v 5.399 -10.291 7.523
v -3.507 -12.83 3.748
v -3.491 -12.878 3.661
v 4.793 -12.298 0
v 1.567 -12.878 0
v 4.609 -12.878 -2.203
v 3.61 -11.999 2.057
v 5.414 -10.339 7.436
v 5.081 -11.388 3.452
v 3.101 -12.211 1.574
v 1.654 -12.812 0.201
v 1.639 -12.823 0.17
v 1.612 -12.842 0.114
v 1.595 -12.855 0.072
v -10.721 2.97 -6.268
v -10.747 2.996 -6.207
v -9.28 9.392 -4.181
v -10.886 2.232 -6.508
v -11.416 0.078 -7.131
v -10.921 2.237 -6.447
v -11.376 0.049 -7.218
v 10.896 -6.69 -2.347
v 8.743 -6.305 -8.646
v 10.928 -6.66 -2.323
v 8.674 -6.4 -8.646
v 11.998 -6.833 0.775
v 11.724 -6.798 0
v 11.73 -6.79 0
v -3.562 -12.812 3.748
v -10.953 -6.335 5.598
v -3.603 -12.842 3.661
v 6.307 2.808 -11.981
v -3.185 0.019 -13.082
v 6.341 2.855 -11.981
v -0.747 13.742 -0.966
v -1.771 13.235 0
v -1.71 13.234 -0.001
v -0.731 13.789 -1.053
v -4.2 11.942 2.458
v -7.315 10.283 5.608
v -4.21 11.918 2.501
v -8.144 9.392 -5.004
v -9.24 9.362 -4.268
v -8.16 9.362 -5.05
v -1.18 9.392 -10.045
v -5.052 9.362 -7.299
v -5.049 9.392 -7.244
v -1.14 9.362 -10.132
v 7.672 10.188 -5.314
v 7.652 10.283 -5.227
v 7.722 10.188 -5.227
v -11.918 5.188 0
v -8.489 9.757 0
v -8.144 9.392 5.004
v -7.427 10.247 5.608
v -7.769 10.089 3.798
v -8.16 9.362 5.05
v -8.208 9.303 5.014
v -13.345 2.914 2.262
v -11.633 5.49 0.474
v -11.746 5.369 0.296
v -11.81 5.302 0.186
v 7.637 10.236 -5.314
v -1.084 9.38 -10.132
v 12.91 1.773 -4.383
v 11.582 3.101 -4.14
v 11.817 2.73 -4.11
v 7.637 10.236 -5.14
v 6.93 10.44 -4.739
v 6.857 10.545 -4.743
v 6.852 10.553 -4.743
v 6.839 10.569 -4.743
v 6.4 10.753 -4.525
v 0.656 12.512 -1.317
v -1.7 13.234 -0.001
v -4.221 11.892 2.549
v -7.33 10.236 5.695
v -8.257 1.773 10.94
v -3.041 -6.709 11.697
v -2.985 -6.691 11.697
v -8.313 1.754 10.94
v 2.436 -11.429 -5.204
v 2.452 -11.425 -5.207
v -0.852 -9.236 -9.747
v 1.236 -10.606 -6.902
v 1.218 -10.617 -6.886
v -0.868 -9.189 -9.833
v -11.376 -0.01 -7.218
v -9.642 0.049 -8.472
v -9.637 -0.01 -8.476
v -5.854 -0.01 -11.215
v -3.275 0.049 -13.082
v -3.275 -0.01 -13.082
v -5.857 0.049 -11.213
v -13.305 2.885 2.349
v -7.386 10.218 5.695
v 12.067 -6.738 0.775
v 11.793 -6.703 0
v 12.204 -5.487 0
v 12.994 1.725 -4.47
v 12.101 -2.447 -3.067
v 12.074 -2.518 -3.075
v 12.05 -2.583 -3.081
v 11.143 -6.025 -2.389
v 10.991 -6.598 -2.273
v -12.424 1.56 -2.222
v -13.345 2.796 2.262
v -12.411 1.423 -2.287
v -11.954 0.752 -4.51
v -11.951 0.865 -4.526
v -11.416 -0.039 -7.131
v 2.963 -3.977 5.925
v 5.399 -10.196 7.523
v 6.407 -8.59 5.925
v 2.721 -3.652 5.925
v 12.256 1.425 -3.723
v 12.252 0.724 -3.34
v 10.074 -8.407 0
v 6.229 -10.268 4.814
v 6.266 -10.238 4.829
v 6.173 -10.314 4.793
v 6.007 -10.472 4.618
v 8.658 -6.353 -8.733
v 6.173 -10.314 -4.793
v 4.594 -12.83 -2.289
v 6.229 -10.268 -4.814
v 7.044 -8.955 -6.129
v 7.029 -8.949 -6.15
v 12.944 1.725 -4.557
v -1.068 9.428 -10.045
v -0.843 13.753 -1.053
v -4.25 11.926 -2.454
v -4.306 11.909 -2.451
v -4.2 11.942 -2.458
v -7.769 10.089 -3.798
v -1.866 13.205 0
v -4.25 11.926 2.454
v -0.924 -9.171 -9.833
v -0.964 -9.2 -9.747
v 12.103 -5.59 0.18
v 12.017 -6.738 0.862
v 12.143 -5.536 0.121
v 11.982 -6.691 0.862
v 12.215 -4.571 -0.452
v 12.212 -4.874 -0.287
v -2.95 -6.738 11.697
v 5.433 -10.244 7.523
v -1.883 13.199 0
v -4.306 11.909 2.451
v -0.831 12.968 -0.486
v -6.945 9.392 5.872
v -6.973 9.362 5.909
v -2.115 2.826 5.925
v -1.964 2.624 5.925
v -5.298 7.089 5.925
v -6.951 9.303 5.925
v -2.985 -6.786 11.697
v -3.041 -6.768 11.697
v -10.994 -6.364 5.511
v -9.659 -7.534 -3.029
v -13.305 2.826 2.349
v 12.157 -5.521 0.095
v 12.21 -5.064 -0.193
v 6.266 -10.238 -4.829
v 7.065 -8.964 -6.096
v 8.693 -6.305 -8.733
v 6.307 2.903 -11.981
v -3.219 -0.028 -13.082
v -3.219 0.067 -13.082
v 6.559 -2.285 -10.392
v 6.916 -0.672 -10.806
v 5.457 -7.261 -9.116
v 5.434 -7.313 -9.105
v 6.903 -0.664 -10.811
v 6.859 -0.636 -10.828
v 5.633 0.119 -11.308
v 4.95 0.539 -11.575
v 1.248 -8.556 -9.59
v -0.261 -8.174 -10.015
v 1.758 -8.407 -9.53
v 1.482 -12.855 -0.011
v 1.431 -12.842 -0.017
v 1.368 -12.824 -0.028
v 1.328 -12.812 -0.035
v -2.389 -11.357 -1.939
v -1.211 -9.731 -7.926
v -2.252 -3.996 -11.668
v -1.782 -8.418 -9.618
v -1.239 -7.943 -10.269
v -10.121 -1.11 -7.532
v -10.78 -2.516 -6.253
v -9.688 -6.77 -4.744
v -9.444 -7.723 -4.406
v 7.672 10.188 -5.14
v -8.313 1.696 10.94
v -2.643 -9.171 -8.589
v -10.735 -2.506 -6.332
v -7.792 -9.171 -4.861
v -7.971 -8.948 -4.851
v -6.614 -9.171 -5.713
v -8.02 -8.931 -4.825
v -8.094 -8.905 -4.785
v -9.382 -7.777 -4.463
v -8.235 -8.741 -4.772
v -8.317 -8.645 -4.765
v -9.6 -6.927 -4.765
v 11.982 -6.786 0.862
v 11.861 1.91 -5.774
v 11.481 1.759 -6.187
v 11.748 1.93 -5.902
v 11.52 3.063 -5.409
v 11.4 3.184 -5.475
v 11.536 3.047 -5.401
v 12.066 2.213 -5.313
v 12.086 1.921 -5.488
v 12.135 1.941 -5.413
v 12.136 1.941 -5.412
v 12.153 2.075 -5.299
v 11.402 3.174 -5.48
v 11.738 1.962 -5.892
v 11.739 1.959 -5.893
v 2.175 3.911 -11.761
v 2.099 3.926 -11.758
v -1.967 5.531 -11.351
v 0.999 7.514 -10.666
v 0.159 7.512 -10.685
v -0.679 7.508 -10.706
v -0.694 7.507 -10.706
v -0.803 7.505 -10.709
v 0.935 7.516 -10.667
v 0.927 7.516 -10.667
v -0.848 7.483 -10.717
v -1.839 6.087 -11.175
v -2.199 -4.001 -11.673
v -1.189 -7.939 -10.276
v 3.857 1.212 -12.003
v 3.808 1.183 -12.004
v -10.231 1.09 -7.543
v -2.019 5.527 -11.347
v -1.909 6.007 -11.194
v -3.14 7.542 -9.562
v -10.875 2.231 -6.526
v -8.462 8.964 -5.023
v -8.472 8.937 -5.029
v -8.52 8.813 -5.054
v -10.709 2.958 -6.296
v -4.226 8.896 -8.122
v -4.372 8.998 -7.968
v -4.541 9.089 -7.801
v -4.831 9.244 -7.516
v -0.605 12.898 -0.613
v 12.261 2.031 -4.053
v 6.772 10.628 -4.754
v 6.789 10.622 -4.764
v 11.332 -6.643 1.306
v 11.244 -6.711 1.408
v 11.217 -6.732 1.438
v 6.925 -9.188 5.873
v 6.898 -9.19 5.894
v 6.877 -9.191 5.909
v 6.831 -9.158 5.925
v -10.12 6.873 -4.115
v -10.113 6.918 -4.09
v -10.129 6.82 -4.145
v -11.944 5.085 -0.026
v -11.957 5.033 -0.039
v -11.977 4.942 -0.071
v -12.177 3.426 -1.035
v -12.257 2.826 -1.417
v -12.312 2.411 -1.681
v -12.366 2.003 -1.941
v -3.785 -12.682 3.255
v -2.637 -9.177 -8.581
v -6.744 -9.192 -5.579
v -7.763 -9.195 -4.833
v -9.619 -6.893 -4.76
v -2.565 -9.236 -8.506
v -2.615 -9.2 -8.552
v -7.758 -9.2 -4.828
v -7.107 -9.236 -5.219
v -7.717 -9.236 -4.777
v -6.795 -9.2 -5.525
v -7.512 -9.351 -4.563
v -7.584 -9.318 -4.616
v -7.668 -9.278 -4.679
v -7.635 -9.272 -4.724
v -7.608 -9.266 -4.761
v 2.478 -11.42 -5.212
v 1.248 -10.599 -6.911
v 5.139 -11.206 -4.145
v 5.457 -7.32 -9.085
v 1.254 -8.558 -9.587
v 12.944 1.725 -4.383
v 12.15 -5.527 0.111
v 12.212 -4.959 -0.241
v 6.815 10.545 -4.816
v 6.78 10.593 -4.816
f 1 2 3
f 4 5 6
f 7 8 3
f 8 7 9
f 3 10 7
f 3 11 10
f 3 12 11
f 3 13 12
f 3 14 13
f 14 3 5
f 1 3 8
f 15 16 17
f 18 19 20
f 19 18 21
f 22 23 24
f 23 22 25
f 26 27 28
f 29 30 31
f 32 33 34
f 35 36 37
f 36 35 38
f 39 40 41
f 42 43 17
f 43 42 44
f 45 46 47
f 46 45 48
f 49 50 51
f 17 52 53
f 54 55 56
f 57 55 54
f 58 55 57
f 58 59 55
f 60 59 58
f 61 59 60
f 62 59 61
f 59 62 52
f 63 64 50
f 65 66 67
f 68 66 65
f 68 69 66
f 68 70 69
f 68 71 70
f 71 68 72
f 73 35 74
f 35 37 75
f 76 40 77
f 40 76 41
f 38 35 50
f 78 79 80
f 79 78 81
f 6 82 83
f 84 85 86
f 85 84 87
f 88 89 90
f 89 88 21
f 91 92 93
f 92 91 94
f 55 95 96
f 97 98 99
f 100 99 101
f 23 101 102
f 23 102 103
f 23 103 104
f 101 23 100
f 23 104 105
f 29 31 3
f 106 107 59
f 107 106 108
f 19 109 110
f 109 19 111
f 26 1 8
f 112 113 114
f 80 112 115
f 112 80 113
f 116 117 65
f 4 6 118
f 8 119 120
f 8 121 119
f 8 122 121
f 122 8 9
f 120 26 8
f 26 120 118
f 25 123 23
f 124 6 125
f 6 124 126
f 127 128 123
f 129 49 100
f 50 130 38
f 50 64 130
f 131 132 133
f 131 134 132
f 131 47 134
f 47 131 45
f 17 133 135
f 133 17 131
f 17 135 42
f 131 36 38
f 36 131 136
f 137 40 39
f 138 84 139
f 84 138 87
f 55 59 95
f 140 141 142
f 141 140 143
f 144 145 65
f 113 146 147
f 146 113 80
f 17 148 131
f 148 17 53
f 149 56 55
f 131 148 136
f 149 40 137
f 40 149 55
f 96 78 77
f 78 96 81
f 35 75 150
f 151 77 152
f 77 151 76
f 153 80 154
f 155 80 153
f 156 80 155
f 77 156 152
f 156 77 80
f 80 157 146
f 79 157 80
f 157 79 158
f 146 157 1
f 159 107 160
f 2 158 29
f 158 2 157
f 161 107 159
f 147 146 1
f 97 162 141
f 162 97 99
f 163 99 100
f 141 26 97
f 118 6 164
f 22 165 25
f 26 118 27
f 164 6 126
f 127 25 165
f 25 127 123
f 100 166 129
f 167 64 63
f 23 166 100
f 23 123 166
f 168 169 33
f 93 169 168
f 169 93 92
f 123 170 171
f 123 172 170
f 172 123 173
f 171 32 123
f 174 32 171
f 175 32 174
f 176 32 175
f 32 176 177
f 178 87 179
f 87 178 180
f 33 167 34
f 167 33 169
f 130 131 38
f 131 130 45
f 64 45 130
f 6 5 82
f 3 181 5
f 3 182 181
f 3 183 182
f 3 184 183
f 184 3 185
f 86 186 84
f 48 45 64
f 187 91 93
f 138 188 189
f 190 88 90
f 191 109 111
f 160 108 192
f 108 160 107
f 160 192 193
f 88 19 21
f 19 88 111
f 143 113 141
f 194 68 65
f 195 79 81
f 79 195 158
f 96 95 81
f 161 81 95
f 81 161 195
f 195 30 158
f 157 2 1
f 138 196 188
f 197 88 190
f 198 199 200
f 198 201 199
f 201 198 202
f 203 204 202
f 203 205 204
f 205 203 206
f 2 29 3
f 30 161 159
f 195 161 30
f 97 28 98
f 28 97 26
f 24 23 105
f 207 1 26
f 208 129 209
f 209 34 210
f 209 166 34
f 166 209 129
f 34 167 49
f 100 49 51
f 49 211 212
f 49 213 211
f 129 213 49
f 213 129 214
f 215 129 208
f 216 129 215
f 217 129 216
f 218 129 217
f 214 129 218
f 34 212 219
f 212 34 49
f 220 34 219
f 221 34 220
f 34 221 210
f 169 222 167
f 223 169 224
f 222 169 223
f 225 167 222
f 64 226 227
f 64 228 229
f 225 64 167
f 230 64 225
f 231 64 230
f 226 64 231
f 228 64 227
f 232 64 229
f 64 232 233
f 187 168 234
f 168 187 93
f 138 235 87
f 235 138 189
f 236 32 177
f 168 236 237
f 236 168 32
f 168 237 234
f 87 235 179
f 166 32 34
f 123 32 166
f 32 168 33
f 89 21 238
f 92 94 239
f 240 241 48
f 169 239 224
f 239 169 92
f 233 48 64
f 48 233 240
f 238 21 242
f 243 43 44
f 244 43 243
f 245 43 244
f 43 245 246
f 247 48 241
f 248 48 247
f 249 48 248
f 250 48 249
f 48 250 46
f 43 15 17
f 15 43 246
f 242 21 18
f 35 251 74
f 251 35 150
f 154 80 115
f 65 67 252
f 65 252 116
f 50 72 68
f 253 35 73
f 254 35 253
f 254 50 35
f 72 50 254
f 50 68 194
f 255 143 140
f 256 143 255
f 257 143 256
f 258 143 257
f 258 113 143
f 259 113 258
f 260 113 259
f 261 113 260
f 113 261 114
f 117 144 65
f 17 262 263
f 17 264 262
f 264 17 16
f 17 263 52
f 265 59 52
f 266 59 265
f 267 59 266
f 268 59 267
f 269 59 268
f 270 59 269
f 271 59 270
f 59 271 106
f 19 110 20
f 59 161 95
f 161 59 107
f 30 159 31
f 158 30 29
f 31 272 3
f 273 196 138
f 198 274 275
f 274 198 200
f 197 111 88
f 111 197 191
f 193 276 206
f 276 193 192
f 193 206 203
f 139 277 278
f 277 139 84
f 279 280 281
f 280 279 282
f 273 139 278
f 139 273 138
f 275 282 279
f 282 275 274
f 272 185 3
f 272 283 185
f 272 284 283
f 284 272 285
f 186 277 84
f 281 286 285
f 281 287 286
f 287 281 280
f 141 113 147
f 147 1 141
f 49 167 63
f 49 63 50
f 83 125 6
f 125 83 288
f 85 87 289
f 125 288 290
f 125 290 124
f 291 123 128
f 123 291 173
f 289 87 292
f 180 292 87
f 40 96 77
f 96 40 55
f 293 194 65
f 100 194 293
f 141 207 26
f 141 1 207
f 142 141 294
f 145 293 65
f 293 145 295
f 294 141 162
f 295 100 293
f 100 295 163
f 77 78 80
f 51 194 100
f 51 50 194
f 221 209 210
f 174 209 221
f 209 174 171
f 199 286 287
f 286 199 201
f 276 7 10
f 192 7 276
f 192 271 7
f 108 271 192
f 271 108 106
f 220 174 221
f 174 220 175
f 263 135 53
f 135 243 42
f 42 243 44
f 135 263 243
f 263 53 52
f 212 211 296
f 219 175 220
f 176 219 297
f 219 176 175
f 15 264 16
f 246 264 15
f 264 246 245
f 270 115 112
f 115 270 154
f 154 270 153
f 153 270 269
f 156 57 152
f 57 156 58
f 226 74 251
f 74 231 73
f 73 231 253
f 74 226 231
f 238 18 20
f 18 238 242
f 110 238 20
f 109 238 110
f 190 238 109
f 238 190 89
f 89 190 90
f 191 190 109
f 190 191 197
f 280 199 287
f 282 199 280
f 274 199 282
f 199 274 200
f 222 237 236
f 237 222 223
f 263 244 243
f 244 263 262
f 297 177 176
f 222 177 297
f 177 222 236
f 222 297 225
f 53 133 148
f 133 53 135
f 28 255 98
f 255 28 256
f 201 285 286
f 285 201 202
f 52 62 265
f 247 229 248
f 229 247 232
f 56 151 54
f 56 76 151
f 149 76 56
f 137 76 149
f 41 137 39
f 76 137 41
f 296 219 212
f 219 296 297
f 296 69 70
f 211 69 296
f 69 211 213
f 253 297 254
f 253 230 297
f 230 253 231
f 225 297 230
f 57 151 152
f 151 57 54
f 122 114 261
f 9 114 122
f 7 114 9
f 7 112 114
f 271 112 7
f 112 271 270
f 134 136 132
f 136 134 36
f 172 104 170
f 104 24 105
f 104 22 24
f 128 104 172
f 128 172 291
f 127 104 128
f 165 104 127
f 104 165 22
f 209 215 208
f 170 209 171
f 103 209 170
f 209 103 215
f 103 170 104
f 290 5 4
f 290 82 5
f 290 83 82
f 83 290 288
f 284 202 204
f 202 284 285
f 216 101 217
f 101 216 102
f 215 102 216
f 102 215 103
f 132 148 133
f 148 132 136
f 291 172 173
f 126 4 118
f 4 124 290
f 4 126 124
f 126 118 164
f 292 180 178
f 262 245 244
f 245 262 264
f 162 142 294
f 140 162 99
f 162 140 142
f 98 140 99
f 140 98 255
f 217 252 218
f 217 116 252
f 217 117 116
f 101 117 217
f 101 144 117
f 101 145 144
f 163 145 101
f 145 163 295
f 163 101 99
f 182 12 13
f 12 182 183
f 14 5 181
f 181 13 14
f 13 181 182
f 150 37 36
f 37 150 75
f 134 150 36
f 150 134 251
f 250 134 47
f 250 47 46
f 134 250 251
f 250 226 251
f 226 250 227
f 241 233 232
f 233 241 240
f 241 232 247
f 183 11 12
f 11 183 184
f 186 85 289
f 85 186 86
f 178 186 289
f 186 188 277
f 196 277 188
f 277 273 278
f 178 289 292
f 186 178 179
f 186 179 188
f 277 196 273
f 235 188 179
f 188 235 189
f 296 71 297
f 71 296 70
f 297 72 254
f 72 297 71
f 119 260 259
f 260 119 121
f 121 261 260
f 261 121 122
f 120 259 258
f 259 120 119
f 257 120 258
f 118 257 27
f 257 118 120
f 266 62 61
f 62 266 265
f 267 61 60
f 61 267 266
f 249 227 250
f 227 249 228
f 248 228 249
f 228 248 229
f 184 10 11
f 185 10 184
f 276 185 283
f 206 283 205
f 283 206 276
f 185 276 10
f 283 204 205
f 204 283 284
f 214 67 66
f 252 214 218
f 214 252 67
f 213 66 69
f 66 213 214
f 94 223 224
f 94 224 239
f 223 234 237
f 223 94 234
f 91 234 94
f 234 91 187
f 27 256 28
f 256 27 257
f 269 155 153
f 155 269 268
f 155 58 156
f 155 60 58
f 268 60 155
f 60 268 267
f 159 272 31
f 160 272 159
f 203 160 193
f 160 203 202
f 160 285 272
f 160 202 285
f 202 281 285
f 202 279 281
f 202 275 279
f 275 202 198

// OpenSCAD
// Auto-generated OpenSCAD file

    inner_points = 10*[[-0.8272709439258851, 0.17250574680152558, -1.085356370379995], [-0.3000208722060624, -0.673824517218672, -1.1610692891914136], [0.7621572748828489, 1.018836010821184, 0.5227077285305861], [1.2894073466026714, 0.17250574680098618, 0.44699480971916755], [-0.7345602979402426, 1.0188360108215655, -0.5608281820767405], [0.53833397596794, -1.0243859908227981, -0.74361533751812], [-0.07619757329115358, 1.3693974844253103, 0.10525377685729254], [1.1966967006170288, -0.6738245172190535, -0.0775333785840871], [-1.0912605548199168, -0.6305363851239965, -0.5510972387851012], [0.6291241521432895, 0.2855248915222844, 1.189458799445929], [-0.9199536182758472, 0.9332780322219801, 0.41810447601210515], [0.4578172155992198, -1.278289525823692, 0.22025708464872243], [-1.326431597387023, 0.2855248915227826, -0.22624909246720426], [-0.3522004978329189, -1.2782895258234854, -0.36614832454032104], [-0.10993590484370842, 0.9332780322217736, 1.0045098852011487], [0.8642951947103956, -0.6305363851244946, 0.864610653128032], [0.018107748679271438, 0.7039670605239071, -1.1390568182894552], [0.5453578203990939, -0.14236320349629056, -1.2147697371008737], [0.6764704733283603, 1.054528534127652, -0.47297485935542216], [1.203720545048183, 0.20819827010745423, -0.5486877781668408]];

    outer_points = 10*[[0.8642951947101556, -0.6305363851244028, -0.8646106531284449], [0.6291241521429305, 0.28552489152246463, -1.1894587994460062], [-1.0912605548197898, -0.6305363851244028, 0.551097238785195], [-1.3264315973870149, 0.28552489152246463, 0.22624909246763364], [0.45781721559917127, -1.2782895258238085, -0.2202570846492242], [-0.10993590484404386, 0.9332780322218704, -1.0045098852008405], [-0.35220049783281543, -1.2782895258238085, 0.3661483245400292], [-0.9199536182760306, 0.9332780322218704, -0.41810447601158707], [1.2894073466025096, 0.17250574680096908, -0.4469948097194502], [-0.8272709439256501, 0.17250574680096908, 1.0853563703802613], [0.5383339759681318, -1.0243859908232005, 0.7436153375176736], [-0.0761975732912725, 1.3693974844251389, -0.1052537768568624], [1.1966967006170348, -0.6738245172192313, 0.07753337858357512], [0.7621572748826352, 1.0188360108211696, -0.5227077285304783], [-0.3000208722057758, -0.6738245172192313, 1.1610692891912895], [-0.7345602979401754, 1.0188360108211696, 0.5608281820772362], [-0.08831976886428294, -0.9141133036386847, -0.9746509296639724], [-0.323490811431508, 0.001947973008182724, -1.299499075981534], [-0.8983374822962696, -0.9141133036386847, -0.38824552047471894], [-1.1335085248634946, 0.001947973008182724, -0.7130936667922804]];

    // Convex hull for inner set (I)
    module inner_hull() {
        hull() {
            for (p = inner_points) {
                translate(p) sphere(r=0.1);
            }
        }
    }

    // Convex hull for outer set (O) minus inner hull (O \ I)
    module outer_minus_inner() {
        difference() {
            hull() {
                for (p = outer_points) {
                    translate(p) sphere(r=0.1);
                }
            }
            inner_hull(); // Subtract inner hull
        }
    }

    // Convex hull for outer set (O) minus all translated inner hulls
    module outer_minus_AllTranslationInner() {
        difference() {
            hull() {
                for (p = outer_points) {
                    translate(p) sphere(r=0.1);
                }
            }
            hull() {
                translate([0,0,50]) inner_hull();
                translate([0,0,-50]) inner_hull();
            }; // Subtract translated inner hulls
        }
    }

    // Difference between outer_minus_inner and outer_minus_AllTranslationInner
    module outer_minus_inner_diff() {
        difference() {
            // Outer minus inner
            difference() {
                hull() {
                    for (p = outer_points) {
                        translate(p) sphere(r=0.1);
                    }
                }
                inner_hull();
            }

            // Subtract Outer minus AllTranslationInner
            difference() {
                hull() {
                    for (p = outer_points) {
                        translate(p) sphere(r=0.1);
                    }
                }
                hull() {
                    translate([0,0,50]) inner_hull();
                    translate([0,0,-50]) inner_hull();
                };
            }
        }
    }

    // Rendering all with colors applied
    color([1, 1, 0, 1]) outer_minus_inner_diff(); // Opaque yellow
    
